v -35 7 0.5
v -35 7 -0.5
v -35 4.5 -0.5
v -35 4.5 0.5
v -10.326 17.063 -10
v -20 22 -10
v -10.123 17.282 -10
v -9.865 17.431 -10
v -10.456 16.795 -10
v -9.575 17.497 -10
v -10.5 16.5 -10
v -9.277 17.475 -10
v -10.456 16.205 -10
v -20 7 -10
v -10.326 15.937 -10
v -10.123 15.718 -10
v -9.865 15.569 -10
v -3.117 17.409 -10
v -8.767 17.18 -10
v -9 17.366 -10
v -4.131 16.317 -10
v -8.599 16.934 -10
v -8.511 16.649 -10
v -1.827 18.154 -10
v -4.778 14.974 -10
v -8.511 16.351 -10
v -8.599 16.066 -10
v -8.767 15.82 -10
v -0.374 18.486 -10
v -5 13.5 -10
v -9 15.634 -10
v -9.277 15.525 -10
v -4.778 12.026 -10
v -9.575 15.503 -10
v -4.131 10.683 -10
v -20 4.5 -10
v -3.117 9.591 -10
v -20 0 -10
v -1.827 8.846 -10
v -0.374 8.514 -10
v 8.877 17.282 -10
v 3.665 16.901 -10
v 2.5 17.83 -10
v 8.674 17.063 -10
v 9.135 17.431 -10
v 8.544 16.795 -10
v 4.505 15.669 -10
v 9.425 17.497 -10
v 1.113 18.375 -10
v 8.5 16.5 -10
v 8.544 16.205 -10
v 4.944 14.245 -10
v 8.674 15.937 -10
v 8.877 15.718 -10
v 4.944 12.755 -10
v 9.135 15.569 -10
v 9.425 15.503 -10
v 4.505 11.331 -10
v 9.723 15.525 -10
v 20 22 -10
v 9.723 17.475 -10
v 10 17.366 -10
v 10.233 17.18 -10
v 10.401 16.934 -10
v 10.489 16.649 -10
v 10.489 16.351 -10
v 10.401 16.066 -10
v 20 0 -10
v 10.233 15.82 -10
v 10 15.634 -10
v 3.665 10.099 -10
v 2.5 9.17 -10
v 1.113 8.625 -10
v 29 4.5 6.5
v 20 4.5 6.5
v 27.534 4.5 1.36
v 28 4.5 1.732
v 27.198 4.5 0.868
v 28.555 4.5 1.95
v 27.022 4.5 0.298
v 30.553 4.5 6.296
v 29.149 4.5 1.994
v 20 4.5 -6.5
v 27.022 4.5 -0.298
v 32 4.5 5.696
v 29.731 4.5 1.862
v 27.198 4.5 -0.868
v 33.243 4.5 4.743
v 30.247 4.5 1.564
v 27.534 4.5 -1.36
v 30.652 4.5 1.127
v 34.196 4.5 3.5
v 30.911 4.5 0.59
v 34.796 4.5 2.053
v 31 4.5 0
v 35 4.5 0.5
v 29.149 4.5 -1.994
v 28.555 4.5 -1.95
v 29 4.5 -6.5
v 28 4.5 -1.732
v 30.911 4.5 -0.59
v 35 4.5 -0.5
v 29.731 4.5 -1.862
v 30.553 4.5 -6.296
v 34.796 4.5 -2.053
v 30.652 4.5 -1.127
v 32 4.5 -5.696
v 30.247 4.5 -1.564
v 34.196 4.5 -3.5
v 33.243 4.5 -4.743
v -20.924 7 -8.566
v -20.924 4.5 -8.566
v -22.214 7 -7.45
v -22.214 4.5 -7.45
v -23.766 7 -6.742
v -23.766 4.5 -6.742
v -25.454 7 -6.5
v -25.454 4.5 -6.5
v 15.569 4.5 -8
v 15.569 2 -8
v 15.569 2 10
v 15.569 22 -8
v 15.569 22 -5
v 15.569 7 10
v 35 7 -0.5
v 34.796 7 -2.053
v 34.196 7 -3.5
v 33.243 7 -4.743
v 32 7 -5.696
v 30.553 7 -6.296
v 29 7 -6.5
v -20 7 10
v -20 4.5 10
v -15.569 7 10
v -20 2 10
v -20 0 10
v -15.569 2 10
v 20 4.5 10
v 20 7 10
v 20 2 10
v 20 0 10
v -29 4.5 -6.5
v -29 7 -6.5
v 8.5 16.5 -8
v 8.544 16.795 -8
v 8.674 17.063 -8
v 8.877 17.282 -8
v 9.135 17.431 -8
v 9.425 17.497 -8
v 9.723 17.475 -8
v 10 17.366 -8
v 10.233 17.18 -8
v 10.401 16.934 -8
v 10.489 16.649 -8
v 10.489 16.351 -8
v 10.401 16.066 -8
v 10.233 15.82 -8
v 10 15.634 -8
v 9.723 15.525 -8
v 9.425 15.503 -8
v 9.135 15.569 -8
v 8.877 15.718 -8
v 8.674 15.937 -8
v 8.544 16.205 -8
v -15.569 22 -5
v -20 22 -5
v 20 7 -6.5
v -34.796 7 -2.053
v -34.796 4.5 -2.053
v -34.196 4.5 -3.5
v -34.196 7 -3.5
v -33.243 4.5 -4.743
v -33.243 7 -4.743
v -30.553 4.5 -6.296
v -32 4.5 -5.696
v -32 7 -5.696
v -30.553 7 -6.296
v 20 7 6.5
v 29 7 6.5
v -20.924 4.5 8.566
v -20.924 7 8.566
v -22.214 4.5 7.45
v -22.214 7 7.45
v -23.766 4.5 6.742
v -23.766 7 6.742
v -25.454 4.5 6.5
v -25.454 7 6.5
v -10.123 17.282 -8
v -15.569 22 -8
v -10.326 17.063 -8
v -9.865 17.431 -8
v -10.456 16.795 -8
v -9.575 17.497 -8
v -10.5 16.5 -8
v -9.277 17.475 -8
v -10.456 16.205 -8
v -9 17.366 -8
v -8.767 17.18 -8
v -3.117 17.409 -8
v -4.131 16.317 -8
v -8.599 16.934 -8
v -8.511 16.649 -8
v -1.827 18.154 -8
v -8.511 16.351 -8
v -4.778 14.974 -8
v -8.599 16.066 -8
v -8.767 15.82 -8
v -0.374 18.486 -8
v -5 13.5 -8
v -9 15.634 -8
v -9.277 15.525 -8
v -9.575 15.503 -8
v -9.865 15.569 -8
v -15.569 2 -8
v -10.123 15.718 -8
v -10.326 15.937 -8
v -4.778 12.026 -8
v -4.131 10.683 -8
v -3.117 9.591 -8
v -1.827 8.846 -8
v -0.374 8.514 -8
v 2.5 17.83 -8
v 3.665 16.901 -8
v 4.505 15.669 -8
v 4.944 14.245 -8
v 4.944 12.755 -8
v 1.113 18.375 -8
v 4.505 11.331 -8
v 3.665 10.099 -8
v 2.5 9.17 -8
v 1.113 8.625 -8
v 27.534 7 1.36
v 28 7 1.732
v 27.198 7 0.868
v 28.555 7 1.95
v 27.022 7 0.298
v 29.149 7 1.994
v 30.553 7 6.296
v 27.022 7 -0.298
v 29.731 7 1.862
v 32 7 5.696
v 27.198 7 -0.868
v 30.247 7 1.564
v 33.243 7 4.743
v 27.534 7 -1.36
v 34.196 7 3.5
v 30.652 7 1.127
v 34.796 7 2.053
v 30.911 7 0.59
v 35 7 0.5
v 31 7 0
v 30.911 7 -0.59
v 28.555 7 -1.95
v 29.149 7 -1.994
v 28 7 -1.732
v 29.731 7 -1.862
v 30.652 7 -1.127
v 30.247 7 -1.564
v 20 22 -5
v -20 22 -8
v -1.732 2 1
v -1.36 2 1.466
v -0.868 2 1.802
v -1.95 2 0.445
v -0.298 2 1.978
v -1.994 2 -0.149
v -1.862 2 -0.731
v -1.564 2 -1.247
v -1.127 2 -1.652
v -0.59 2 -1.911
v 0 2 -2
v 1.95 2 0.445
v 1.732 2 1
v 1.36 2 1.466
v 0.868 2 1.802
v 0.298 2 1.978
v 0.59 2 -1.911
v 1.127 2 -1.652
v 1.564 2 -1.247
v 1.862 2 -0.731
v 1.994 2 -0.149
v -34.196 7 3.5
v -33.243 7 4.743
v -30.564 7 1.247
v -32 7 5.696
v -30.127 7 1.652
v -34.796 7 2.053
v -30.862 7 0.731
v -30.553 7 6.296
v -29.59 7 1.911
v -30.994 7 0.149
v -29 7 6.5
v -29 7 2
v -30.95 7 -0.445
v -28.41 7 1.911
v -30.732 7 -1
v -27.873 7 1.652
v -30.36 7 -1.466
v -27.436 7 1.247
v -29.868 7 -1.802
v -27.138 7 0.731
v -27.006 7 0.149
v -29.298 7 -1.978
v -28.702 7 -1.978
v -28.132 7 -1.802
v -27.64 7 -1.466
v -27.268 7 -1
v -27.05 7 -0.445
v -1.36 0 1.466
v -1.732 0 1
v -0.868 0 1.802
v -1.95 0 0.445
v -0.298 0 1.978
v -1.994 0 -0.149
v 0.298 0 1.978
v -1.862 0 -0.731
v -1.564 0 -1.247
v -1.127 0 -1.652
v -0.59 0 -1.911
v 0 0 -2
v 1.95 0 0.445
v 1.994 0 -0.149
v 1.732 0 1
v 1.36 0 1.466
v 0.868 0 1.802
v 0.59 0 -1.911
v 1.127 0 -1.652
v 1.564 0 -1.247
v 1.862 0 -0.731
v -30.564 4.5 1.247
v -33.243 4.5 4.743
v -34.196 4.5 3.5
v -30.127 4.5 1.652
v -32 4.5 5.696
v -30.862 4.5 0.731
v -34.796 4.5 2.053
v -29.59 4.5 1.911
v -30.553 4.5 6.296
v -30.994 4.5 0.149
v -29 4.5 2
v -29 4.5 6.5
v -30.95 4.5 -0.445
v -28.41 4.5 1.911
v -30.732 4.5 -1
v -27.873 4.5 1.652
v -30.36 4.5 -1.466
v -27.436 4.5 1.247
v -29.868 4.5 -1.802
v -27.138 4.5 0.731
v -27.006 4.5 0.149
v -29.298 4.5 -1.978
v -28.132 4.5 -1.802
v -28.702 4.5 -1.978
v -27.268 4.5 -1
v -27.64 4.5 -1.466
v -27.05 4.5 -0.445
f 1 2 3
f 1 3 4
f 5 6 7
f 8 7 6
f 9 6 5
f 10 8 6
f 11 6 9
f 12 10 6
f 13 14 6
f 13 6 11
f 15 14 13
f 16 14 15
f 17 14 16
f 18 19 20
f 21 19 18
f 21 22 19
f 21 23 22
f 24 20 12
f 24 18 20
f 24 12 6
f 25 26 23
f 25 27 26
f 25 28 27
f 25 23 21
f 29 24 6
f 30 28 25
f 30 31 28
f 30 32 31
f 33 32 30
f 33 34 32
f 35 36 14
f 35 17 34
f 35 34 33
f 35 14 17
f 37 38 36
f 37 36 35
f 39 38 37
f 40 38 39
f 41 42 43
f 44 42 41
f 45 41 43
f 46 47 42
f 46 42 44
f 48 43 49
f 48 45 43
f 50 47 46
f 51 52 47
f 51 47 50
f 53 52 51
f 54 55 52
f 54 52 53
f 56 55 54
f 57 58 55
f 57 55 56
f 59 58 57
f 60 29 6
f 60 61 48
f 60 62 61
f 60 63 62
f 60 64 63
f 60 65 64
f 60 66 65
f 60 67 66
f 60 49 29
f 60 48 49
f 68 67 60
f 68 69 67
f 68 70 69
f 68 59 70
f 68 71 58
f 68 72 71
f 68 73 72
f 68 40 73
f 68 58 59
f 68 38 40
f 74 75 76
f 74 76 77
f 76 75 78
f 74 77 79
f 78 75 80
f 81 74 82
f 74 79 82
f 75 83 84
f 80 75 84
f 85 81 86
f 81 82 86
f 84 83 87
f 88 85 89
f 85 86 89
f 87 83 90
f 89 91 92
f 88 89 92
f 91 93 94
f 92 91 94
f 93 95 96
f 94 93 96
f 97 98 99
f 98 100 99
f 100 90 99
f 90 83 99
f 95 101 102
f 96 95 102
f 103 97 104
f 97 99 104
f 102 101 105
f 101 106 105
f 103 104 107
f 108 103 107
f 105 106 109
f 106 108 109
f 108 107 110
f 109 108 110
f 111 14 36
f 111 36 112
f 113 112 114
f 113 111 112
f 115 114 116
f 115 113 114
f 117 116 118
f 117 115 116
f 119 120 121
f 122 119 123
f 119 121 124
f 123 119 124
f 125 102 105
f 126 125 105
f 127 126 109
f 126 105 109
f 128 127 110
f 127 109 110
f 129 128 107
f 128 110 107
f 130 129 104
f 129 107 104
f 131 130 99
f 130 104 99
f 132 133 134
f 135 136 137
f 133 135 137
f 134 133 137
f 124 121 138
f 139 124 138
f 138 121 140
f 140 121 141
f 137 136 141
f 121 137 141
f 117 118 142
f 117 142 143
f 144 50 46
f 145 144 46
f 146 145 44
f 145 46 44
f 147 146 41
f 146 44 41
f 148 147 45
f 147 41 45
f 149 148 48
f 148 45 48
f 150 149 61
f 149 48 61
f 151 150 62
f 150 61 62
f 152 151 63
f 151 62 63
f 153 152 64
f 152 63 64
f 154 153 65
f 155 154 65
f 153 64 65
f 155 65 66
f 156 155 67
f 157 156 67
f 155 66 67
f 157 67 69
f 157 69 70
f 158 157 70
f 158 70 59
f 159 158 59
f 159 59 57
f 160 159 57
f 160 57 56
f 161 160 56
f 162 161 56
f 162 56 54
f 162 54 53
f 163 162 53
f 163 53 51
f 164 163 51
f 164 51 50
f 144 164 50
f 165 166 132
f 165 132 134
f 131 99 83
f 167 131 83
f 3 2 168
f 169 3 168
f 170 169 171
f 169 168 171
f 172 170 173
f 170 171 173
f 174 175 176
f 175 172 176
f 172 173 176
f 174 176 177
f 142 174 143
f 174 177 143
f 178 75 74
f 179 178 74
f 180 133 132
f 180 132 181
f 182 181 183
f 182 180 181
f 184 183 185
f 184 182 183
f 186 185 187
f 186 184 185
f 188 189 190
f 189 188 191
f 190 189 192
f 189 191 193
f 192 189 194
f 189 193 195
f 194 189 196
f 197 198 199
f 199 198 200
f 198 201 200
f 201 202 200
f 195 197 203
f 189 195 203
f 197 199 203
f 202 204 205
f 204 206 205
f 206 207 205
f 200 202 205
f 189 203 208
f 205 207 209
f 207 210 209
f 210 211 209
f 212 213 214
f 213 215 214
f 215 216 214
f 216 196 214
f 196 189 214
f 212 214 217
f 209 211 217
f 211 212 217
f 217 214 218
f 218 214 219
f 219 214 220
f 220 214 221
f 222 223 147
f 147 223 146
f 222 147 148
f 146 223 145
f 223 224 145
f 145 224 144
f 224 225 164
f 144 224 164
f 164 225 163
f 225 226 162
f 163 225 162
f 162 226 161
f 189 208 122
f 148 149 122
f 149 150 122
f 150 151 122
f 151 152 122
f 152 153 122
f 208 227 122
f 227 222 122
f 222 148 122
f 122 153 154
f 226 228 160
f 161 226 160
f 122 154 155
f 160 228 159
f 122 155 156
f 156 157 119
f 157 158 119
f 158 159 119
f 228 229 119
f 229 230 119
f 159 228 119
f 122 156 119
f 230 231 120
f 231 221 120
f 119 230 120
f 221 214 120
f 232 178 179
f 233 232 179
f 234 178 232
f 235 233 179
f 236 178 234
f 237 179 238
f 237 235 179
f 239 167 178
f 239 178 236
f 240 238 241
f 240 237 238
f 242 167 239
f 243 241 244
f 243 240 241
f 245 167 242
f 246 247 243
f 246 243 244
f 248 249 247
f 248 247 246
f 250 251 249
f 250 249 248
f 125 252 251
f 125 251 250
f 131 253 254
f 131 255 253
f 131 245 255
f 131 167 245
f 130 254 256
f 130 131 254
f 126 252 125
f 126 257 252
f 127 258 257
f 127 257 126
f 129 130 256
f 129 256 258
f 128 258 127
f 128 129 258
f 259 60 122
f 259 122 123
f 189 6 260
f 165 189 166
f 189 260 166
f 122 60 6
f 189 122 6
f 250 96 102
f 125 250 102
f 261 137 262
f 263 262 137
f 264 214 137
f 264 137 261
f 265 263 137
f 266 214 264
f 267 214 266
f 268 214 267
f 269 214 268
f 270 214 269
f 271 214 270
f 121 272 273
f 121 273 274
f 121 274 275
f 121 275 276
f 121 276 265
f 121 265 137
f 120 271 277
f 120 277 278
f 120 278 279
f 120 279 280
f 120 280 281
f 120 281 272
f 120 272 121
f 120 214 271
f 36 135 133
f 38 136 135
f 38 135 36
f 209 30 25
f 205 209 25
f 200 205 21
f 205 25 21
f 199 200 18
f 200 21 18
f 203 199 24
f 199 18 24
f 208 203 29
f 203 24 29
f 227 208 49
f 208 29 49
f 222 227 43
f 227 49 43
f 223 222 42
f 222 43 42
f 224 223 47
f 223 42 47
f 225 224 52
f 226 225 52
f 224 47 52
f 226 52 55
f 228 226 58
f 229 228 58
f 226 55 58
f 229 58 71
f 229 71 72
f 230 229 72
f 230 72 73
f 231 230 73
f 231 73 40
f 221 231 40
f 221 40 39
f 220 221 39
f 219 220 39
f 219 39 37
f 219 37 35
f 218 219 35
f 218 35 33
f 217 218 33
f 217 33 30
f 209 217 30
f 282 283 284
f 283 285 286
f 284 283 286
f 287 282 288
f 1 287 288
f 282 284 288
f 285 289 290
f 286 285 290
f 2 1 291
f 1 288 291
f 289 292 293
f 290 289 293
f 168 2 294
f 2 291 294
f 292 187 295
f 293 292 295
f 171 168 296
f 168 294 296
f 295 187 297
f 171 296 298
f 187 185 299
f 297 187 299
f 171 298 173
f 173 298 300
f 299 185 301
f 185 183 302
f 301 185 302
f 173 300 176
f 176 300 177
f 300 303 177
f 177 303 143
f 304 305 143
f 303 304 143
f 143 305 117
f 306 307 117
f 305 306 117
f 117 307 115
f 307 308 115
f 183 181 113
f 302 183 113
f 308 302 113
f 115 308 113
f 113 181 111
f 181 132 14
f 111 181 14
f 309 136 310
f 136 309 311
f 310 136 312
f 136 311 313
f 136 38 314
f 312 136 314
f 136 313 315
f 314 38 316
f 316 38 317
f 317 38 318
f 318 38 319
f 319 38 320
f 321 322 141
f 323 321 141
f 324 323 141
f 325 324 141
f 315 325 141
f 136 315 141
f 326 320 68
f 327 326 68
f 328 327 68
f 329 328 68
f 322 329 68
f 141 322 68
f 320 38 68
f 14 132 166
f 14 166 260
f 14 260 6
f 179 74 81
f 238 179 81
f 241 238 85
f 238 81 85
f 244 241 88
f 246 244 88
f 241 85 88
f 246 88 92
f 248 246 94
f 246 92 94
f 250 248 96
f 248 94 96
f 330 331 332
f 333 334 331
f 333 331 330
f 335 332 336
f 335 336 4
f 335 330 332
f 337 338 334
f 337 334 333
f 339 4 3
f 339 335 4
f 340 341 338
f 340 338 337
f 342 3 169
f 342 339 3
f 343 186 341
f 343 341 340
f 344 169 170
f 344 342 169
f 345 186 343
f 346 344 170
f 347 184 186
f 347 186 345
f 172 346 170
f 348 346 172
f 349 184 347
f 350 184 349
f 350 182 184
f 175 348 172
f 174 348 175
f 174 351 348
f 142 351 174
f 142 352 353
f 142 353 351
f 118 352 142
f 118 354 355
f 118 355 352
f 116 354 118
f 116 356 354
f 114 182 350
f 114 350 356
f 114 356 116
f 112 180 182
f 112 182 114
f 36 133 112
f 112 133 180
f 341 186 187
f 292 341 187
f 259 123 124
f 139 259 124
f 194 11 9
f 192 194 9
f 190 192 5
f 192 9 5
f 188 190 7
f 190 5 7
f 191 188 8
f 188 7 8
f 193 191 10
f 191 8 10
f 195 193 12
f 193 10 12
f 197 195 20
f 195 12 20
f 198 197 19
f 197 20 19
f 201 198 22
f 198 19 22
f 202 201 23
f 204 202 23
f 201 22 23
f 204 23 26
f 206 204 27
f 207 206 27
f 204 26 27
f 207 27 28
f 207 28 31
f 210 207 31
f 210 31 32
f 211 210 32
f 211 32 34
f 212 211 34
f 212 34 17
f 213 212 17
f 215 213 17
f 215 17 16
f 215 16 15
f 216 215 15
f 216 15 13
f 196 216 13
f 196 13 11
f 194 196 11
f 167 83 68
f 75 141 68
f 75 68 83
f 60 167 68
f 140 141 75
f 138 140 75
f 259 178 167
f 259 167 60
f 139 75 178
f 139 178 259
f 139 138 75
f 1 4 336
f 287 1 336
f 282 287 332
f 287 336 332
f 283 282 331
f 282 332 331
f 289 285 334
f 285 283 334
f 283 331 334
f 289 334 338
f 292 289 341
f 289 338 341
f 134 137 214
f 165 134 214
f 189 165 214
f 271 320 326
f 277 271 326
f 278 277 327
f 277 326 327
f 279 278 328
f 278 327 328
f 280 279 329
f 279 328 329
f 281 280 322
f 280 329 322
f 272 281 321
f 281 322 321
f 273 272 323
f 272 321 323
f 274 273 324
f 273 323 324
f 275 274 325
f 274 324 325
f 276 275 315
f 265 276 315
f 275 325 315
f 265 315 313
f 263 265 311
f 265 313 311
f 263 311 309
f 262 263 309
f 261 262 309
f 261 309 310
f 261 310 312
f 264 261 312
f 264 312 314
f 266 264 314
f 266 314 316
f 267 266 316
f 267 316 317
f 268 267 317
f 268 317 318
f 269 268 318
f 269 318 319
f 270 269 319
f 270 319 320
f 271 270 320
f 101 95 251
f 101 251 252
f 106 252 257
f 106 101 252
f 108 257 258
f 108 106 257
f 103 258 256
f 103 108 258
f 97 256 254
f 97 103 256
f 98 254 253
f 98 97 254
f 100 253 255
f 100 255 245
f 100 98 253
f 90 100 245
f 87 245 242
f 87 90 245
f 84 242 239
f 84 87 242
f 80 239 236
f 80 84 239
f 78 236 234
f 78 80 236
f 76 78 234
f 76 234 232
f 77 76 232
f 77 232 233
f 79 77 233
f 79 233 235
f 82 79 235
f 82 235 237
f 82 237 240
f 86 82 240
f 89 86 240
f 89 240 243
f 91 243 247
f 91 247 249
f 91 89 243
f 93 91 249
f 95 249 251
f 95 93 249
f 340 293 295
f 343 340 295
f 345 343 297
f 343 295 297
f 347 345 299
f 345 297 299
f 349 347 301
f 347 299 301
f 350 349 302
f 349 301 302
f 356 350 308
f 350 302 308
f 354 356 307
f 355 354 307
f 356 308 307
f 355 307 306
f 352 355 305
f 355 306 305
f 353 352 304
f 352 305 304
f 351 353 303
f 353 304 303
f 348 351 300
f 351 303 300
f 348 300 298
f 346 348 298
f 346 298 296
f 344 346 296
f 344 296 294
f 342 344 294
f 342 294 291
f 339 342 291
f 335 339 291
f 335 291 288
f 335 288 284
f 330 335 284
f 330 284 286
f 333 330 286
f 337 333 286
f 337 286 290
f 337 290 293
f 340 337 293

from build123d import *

# Parameters (mm, degrees)
SKETCH1_W           = 40
SKETCH1_H           = 20
BOSS_EXTRUDE1_DEPTH = 2
SKETCH2_W           = 40
SKETCH2_H           = 2
BOSS_EXTRUDE2_DEPTH = 20
SKETCH4_R           = 5
SKETCH4_R_2         = 1
CUT_EXTRUDE2_DEPTH  = 36.832945734
SKETCH5_R           = 2
CUT_EXTRUDE3_DEPTH  = 32.368774283
SKETCH6_W           = 4.431073847
SKETCH6_H           = 18
BOSS_EXTRUDE3_DEPTH = 20
CHAMFER1_SIZE       = 15
SKETCH7_W           = 13
SKETCH7_H           = 2.5
BOSS_EXTRUDE4_DEPTH = 15
FILLET1_R           = 6
SKETCH8_R           = 2
CUT_EXTRUDE4_DEPTH  = 40.37003937
MIRROR1_START       = 4.5
MIRROR1_OUTLINE_R   = 2
MIRROR1_DEPTH       = 2.5
MIRROR1_START_2     = 2
MIRROR1_2_OUTLINE_W = 4.431073847
MIRROR1_2_OUTLINE_H = 18
MIRROR1_2_DEPTH     = 2.5
MIRROR1_START_3     = 15.568926153
MIRROR1_3_DEPTH     = 4.431073847


with BuildPart() as part:
    # Sketch1 → Boss-Extrude1 (new body)
    with BuildSketch(Plane(origin=(0, 0, 0), x_dir=(1, 0, 0), z_dir=(0, 1, 0))):
        Rectangle(SKETCH1_W, SKETCH1_H)
    extrude(amount=BOSS_EXTRUDE1_DEPTH)

    # Sketch2 → Boss-Extrude2 (add)
    with BuildSketch(Plane(origin=(0, 2, 0), x_dir=(1, 0, 0), z_dir=(0, 1, 0))):
        with Locations((0, 9)):
            Rectangle(SKETCH2_W, SKETCH2_H)
    extrude(amount=BOSS_EXTRUDE2_DEPTH)

    # Sketch4 → Cut-Extrude2 (cut, through all)
    with BuildSketch(Plane(origin=(0, 0, -10), x_dir=(-1, 0, 0), z_dir=(0, 0, -1))):
        with Locations((0, 13.5)):
            Circle(SKETCH4_R)
        with Locations((-9.5, 16.5)):
            Circle(SKETCH4_R_2)
        with Locations((9.5, 16.5)):
            Circle(SKETCH4_R_2)
    extrude(amount=-CUT_EXTRUDE2_DEPTH, mode=Mode.SUBTRACT)

    # Sketch5 → Cut-Extrude3 (cut, through all)
    with BuildSketch(Plane.XZ):
        with Locations(Location((0, 0, 0), (0, 0, 270))):
            Circle(SKETCH5_R)
    extrude(amount=-CUT_EXTRUDE3_DEPTH, mode=Mode.SUBTRACT)

    # Sketch6 → Boss-Extrude3 (add)
    with BuildSketch(Plane(origin=(0, 2, 0), x_dir=(1, 0, 0), z_dir=(0, 1, 0))):
        with Locations((-17.784463076, -1)):
            Rectangle(SKETCH6_W, SKETCH6_H)
    extrude(amount=BOSS_EXTRUDE3_DEPTH)

    # Chamfer1
    chamfer1_edges = [part.edges().sort_by_distance(p)[0] for p in [
        (-17.784463077, 22, 10),
    ]]
    chamfer(chamfer1_edges, length=CHAMFER1_SIZE)

    # Sketch7 → Boss-Extrude4 (add)
    with BuildSketch(Plane.ZY.offset(20)):
        with Locations((0, 5.75)):
            Rectangle(SKETCH7_W, SKETCH7_H)
    extrude(amount=BOSS_EXTRUDE4_DEPTH)

    # Fillet1
    # the kernel refuses this fillet: 6 mm, written as the material it adds along each edge
    with BuildSketch(Plane(origin=(-20, 4.5, 6.5), x_dir=(0, 0, 1), z_dir=(0, 1, 0)), Plane(origin=(-20, 7, -6.5), x_dir=(0, 0, -1), z_dir=(0, -1, 0))) as fillet1_piece_1:
        with BuildLine():
            CenterArc((6, -5.454356057), FILLET1_R, 114.624318352, 65.375681648)
            Line((0, -5.454356057), (0, 0))
            Line((0, 0), (3.5, 0))
        make_face()
    extrude(amount=2.5)
    # the kernel refuses this fillet: 6 mm, written as the material it takes off along each edge
    with BuildSketch(Plane(origin=(-35, -10.5, 6.5), x_dir=(1, 0, 0), z_dir=(0, 1, 0))) as fillet1_2_piece_1:
        with BuildLine():
            CenterArc((FILLET1_R, FILLET1_R), FILLET1_R, 180, 90)
            Line((0, FILLET1_R), (0, 0))
            Line((0, 0), (FILLET1_R, 0))
        make_face()
    extrude(amount=32.5, mode=Mode.SUBTRACT)
    with BuildSketch(Plane(origin=(-35, 22, -6.5), x_dir=(0, 0, 1), z_dir=(0, -1, 0))) as fillet1_2_piece_2:
        with BuildLine():
            CenterArc((FILLET1_R, -FILLET1_R), FILLET1_R, 90, 90)
            Line((0, -FILLET1_R), (0, 0))
            Line((0, 0), (FILLET1_R, 0))
        make_face()
    extrude(amount=32.5, mode=Mode.SUBTRACT)

    # Sketch8 → Cut-Extrude4 (cut, through all)
    with BuildSketch(Plane(origin=(0, 7, 0), x_dir=(1, 0, 0), z_dir=(0, 1, 0))):
        with Locations(Location((-29, 0, 0), (0, 0, 270))):
            Circle(SKETCH8_R)
    extrude(amount=-CUT_EXTRUDE4_DEPTH, mode=Mode.SUBTRACT)

    # Mirror1: read off the stored shape, not the designer's step
    # Mirror1 outline → Mirror1 (add)
    with BuildSketch(Plane(origin=(0, 0, 0), x_dir=(1, 0, 0), z_dir=(0, 1, 0)).offset(MIRROR1_START)):
        with BuildLine():
            Line((20, 6.5), (20, 8))
            Line((20, 8), (15.568926153, 8))
            Line((15.568926153, 8), (15.568926153, -10))
            Line((15.568926153, -10), (20, -10))
            Line((20, -10), (20, -6.5))
            Line((20, -6.5), (29, -6.5))
            ThreePointArc((29, -6.5), (33.242640687, -4.742640687), (35, -0.5))
            Line((35, -0.5), (35, 0.5))
            ThreePointArc((35, 0.5), (33.242640687, 4.742640687), (29, 6.5))
            Line((29, 6.5), (20, 6.5))
        make_face()
        with Locations((29, 0)):
            Circle(MIRROR1_OUTLINE_R, mode=Mode.SUBTRACT)
    extrude(amount=MIRROR1_DEPTH)

    # Mirror1 2 outline → Mirror1 2 (add)
    with BuildSketch(Plane(origin=(0, 0, 0), x_dir=(1, 0, 0), z_dir=(0, 1, 0)).offset(MIRROR1_START_2)):
        with Locations((17.784463076, -1)):
            Rectangle(MIRROR1_2_OUTLINE_W, MIRROR1_2_OUTLINE_H)
    extrude(amount=MIRROR1_2_DEPTH)

    # Mirror1 3 outline → Mirror1 3 (add)
    with BuildSketch(Plane.YZ.offset(MIRROR1_START_3)):
        Polygon((7, -8), (22, -8), (22, -5), (7, 10), align=None)
    extrude(amount=MIRROR1_3_DEPTH)


solid = part.part
